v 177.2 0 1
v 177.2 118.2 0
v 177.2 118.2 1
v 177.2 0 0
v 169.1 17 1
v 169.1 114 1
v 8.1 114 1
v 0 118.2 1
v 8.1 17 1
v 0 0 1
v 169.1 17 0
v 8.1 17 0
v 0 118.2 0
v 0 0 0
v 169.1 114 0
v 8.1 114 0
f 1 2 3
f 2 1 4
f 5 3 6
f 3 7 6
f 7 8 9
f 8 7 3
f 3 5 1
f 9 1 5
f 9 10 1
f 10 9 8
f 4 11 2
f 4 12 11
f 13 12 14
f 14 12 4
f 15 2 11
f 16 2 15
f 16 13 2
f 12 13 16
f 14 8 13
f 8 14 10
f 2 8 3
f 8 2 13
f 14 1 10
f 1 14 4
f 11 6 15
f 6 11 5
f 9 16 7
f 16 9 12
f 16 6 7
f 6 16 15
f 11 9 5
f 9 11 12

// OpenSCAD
// file: part-06.scad
include	<../common/constants.scad>
use <common.scad>
use <part-01.scad>
use <part-02.scad>
use <part-03.scad>

//	그룹 of part1, part2, part3
function PART06() = [PART02().x, PART02().y + PART03().y, PART02().z];
function MARGIN06() = [0, -PART03().y, 0];

module epaper_part_06() {
	translate([MARGIN02().x, (PART02().y - PART01().y) - MARGIN02().y, PART02().z])
	epaper_part_01();
	
	epaper_part_02();

	translate([MARGIN03().x, -PART03().y, 0])
	epaper_part_03();
	
	%
	color("white")
	translate([0, -2.2, 0])
	linear_extrude(height = EPSILON) {
		text(str("⑥ = ①+②+③"), font = "D2Coding", size = 2);
	}
}

module background_06() {
}

module main() {
	%background_06();
	epaper_part_06();
}

main();
// file: part-04.scad
include	<../common/constants.scad>
use <common.scad>
use <part-01.scad>
use <part-02.scad>
use <part-03.scad>
use <part-06.scad>

//	①②③④⑤⑥⑦⑧⑨ⒶⒷⒸⒹⒺⒻⒼⒽⒾⒿⓀⓐⓑⓒⓓⓔⓕⓖⓗⓘⓙⓚⓛⓜⓝ
ID = "④";
SIZE = [0, 0, 2];
PADDING = [3, 3, 1];
PADDING_INNER = [16, 16];	//	밑판 최외곽 너비
MARGIN = [0.5, 0.5, 0.2];
COLOR = [0.8, 0.4, 0.3, 1];

function PART04() = [
	PADDING.x * 2 + MARGIN.x * 2 + PART02().x,
	PADDING.y * 2 + MARGIN.y * 2 + PART02().y,
	SIZE.z + PADDING.z
];
function MARGIN04() = [0, 0, 0];

pNotate = [PART04().x - PADDING_INNER.x - 16, PADDING_INNER.y + 16];

//	밑판
module epaper_display_part_04_01() {
	size = [
		PADDING.x * 2 + MARGIN.x * 2 + PART02().x,
		PADDING.y * 2 + MARGIN.y * 2 + PART02().y,
		SIZE.z
	];

	//	아래쪽
	color(COLOR)
	translate([0, 0, 0])
	cube([size.x, PADDING_INNER.y, size.z]);
	translate([pNotate.x - 2, 0, PART04().z])
	notate([1.5, PADDING.y]);
	translate([pNotate.x - 2, PADDING.y, PART04().z])
	notate([1.5, PADDING_INNER.y - PADDING.y]);
	translate([pNotate.x, 0, PART04().z])
	notate([2, PADDING_INNER.y]);

	//	위쪽
	color(COLOR)
	translate([0, size.y - PADDING_INNER.y, 0])
	cube([size.x, PADDING_INNER.y, size.z]);
	translate([pNotate.x - 2, size.y - PADDING.y, PART04().z])
	notate([1.5, PADDING.y]);
	translate([pNotate.x - 2, size.y - PADDING_INNER.y, PART04().z])
	notate([1.5, PADDING_INNER.y - PADDING.y]);
	translate([pNotate.x, size.y - PADDING_INNER.y, PART04().z])
	notate([2, PADDING_INNER.y]);

	//	가운데
	translate([pNotate.x, PADDING_INNER.y, PART04().z])
	notate([2, PART04().y - PADDING_INNER.y * 2]);
	
	//	왼쪽
	color(COLOR)
	translate([0, PADDING_INNER.y, 0])
	cube([PADDING_INNER.x, size.y - PADDING_INNER.y * 2, size.z]);
	translate([0, pNotate.y + 2, PART04().z])
	notate([PADDING.x, 1.5]);
	translate([PADDING.x, pNotate.y + 2, PART04().z])
	notate([PADDING_INNER.x - PADDING.x, 1.5]);
	translate([0, pNotate.y, PART04().z])
	notate([PADDING_INNER.x, 2]);

	//	오른쪽
	color(COLOR)
	translate([size.x - PADDING_INNER.x, PADDING_INNER.y, 0])
	cube([PADDING_INNER.x, size.y - PADDING_INNER.y * 2, size.z]);
	translate([size.x - PADDING.x, pNotate.y + 2, PART04().z])
	notate([PADDING.x, 1.5]);
	translate([size.x - PADDING_INNER.x, pNotate.y + 2, PART04().z])
	notate([PADDING_INNER.x - PADDING.x, 1.5]);
	translate([size.x - PADDING_INNER.x, pNotate.y, PART04().z])
	notate([PADDING_INNER.x, 2]);

	//	가운데
	translate([PADDING_INNER.x, pNotate.y, PART04().z])
	notate([PART04().x - PADDING_INNER.x * 2, 2]);
	
	//	중앙 가로선
	color(COLOR)
	translate([PADDING_INNER.x, PART04().y / 2 - PADDING_INNER.y / 2, 0])
	cube([size.x - PADDING_INNER.x * 2, PADDING_INNER.y, size.z]);
	translate([pNotate.x - 2, (PART04().y - PADDING_INNER.y) / 2, PART04().z])
	notate([1.5, PADDING_INNER.y]);

	translate([pNotate.x - 2, size.y - PADDING.y, PART04().z])
	notate([1.5, PADDING.y]);

	//	중앙 세로선
	color(COLOR)
	translate([(PART04().x - PADDING_INNER.x) / 2, PADDING_INNER.y, 0])
	cube([PADDING_INNER.x, size.y - PADDING_INNER.y * 2, size.z]);
	translate([(PART04().x - PADDING_INNER.x) / 2, pNotate.y + 2, PART04().z])
	notate([PADDING_INNER.x, 1.5]);
}

module epaper_display_part_04_02() {
	v = PART02();
	s = [
		PADDING.x * 2 + MARGIN.x * 2 + v.x,
		PADDING.y * 2 + MARGIN.y * 2 + v.y,
		PART04().z
	];
	cdelta = 0.1;
	ccolor = [COLOR[0] - cdelta, COLOR[1] - cdelta, COLOR[2] - cdelta, COLOR[3]];

	// 아래
	translate([0, 0, SIZE.z])
	color(ccolor)
	cube([s.x, PADDING.y, PADDING.z]);

	//	아래 왼쪽
	translate([0, -3, 0])
	notate([PADDING.x + MARGIN03().x, 2], up = false);

	//	아래 오른쪽
	translate([PADDING.x + MARGIN03().x + PART03().x + MARGIN.x * 2, -3, 0])
	notate([PADDING.x + MARGIN03().x, 2], str(PADDING.x + MARGIN03().x, "mm"), false);

	//	위
	translate([0, PADDING.y + v.y + MARGIN.y * 2, SIZE.z])
	color(ccolor)
	cube([s.x, PADDING.y, PADDING.z]);

	//	왼쪽
	translate([0, PADDING.y, SIZE.z])
	color(ccolor)
	cube([PADDING.x, s.y - PADDING.y * 2, PADDING.z]);

	//	오른쪽
	translate([PADDING.x + v.x + MARGIN.x * 2, PADDING.y, SIZE.z])
	color(ccolor)
	cube([PADDING.x, s.y - PADDING.y * 2 , PADDING.z]);
}
//	아래쪽에 구멍내는 거, 연결선 빠져 나가는 구멍
module epaper_part_04_03() {
	size = [
		PART03().x + MARGIN.x * 2,
		PADDING.y + MARGIN.y + EPSILON,
		SIZE.z + MARGIN.z + EPSILON];

	translate([0, -EPSILON, -EPSILON])
	cube(size);

	translate([0, -3, -EPSILON])
	notate([size.x, 2]);
}
module background_04() {
	translate([-(PART02().x + PADDING.x + MARGIN.x), PADDING.y + MARGIN.y, 0])
	epaper_part_06();
}

module epaper_part_04() {
	m2 = MARGIN02();
	s3 = PART03();
	s4 = PART04();

	difference() {
		union() {
			epaper_display_part_04_01();
			epaper_display_part_04_02();
		}

		translate([PADDING.x + MARGIN03().x - MARGIN.x * 0, 0, 0])
		epaper_part_04_03();
	}

	%color("white")
	translate([2, PART04().y - 2.3, EPSILON])
	linear_extrude(height = PART04().z) {
		text(str(ID, " Cover: ", PART04().x, " x ", PART04().y, " x ", PART04().z, "mm"), font = "D2Coding", size = 2);
	}
}

module main() {
	%background_04();
	epaper_part_04();
}

main();
// file: part-03.scad
include	<../common/constants.scad>
use <common.scad>
use <part-01.scad>
use <part-02.scad>

function PART03() = [25.50, 24.00, 0.1];
function PADDING03() = [3, 3, 1];
function MARGIN03() = [72.35, 0, 0];

SIZE = [0, 0, 2];
PADDING = [3, 3, 1];
MARGIN = [0.5, 0.5];
COLOR = [0.4, 0.8, 0.4, 0.5];

part01 = PART01();
part02 = PART02();
margin02 = MARGIN02();
part03 = PART03();
part04 = PART04();

function PART04() = [
	PADDING.x * 2 + MARGIN.x * 2 + PART02().x,
	PADDING.y * 2 + MARGIN.y * 2 + PART02().y,
	SIZE.z + PADDING.z
];
function MARGIN04() = [PADDING.x + MARGIN.x, PADDING.y + MARGIN.y, SIZE.z + PADDING.z];

module epaper_part_03() {
	s = PART03();
	m = MARGIN03();
	
	color(COLOR)
	cube(PART03());

	%color("white")
	translate([1, s.y - 4, PART03().z])
	linear_extrude(height = PART03().z + EPSILON) {
		text("3. Connector", size = 2);

		translate([2, -3])
		text(str(s.x, " x ", s.y, " x 0.1", "mm"), size = 2);
	}

	//	가로
	translate([0, 2, PART03().z])
	notate([PART03().x, 2]);
	//	세로
	translate([PART03().x - 4, 0, PART03().z])
	notate([2, PART03().y]);
}

module epaper_display_part_03() {
	s = PART03();
	m = MARGIN03();
	
	translate(m)
	{
		epaper_part_03();
	}
}

module background_03() {
	translate([0, PART03().y, 0])
	epaper_display_part_02();
}

module main() {
	%background_03();
	epaper_display_part_03();
}

epaper_display_part_03();
!epaper_part_03();
// file: part-02.scad
// 라이브러리, 검증된 것만 이곳에
include	<../common/constants.scad>
use <common.scad>
use <part-01.scad>

function PART02() = [170.20, 111.20, 0.91];
function MARGIN02() = [5.10, 4.70];
COLOR02 = [0.5, 0.5, 0.1, 0.9];

module epaper_part_02() {
	s = PART02();
	m = MARGIN02();

	//	Panel
	color(COLOR02)
	cube(s);

	pNotate = [m.x + PART01().x - 8, (s.y - 8) - m.y];

	//	왼쪽 테두리
	translate([0, pNotate.y, PART02().z])
	notate([MARGIN02().x, 2], str(MARGIN02().x, "mm"));

	//	오른쪽 테두리
	translate([pNotate.x + 8, pNotate.y, PART02().z])
	notate([MARGIN02().x, 2], str(MARGIN02().x, "mm"));

	//	위쪽 테두리
	translate([pNotate.x, PART02().y - MARGIN02().y, PART02().z])
	notate([2, MARGIN02().y]);

	//	아래쪽 테두리
	translate([pNotate.x, 0, PART02().z])
	notate([2, PART02().y - PART01().y - MARGIN02().y]);

	%translate([2, s.y - 4, EPSILON])
	color("black")
	linear_extrude(height = s.z) {
		text(str("2. Panel: (", s.x, " x ", s.y, " x ", s.z, "mm), "), size = 2);
	}
}
module epaper_display_part_02() {
	s = PART02();
	m = MARGIN02();

	//	Active Area
	translate([m.x, (s.y - PART01().y) - m.y, s.z])
	epaper_display_part_01();

	epaper_part_02();
}

epaper_display_part_02();
!epaper_part_02();
// file: part-01.scad
// 라이브러리, 검증된 것만 이곳에
include	<../common/constants.scad>
use	<common.scad>

// active area
ACTIVE_AREA_COLOR = [0.3, 0.3, 0.9, 0.9];
function PART01() = [160.00, 96.00, EPSILON];

module epaper_part_01() {
	s = PART01();

	color(ACTIVE_AREA_COLOR)
	cube(s);
	
	translate([0, s.y - 8, s.z])
	notate([s.x, 2]);

	translate([s.x - 8, 0, s.z])
	notate([2, s.y]);

	%translate([2, s.y - 4, EPSILON * 2])
	linear_extrude(height = s.z) {
		text(str("1. Active Area: ", s.x, " x ", s.y, "mm"), font = "D2Coding", size = 2);
	}
}
module epaper_display_part_01() {
	epaper_part_01();
}

epaper_display_part_01();
// file: common.scad
include	<../common/constants.scad>

// A(x0, y0), B(x1, y1), C(x2, y2) 에서 A와 직선 BC 사이 거리 계산
function pointToLineDistance(x0, y0, x1, y1, x2, y2) =
    abs((x2 - x1)*(y1 - y0) - (x1 - x0)*(y2 - y1)) /
    sqrt((x2 - x1)*(x2 - x1) + (y2 - y1)*(y2 - y1));

module HR() {
		echo("_________________________________________________________________________________");
}
module arrow_left(v) {
	leader = v.y / 32;	//	지시선 두께
	polygon([
		[0, 0],
		[leader, 0],
		[leader, v.y],
		[0, v.y]
	]);

	shaft = v.y / 24;	//	화살대 두께
	polygon([
		[0,		v.y / 2],
		[v.y,	0],
		[v.y,	v.y / 2 - shaft],
		[v.y,	v.y / 2 + shaft],
		[v.y,	v.y],

		[v.x,	v.y / 2 - shaft],
		[v.x,	v.y / 2 + shaft]
	],
	paths=[[0, 1, 2, 5, 6, 3, 4]]);
}
module arrow_right(v) {
	translate(v)
	rotate([0, 0, 180])
	arrow_left(v);
}
module arrow_up(v) {
	translate([0, v.y])
	rotate([0, 0, -90])
	arrow_left([v.y, v.x]);
}
module arrow_down(v) {
	translate([v.x, 0])
	rotate([0, 0, 90])
	arrow_left([v.y, v.x]);
}

module notateHI(v, title) {
	titleSize = v.y * len(title);

	arrow_left([(v.x - titleSize) / 2, v.y]);

	translate([v.x - (v.x - titleSize) / 2, 0])
	arrow_right([(v.x - titleSize) / 2, v.y]);

	translate([(v.x - titleSize) / 2, 0])
	text(title, font = "D2Coding", size = v.y);
}
module notateHO(v, title) {
	titleSize = v.y * len(title);
	arrowSize = v.y * 3;

	translate([-arrowSize, 0])
	arrow_right([arrowSize, v.y]);

	translate([v.x, 0])
	arrow_left([arrowSize, v.y]);

	translate([(v.x - titleSize) / 2, 0])
	text(title, font = "D2Coding", size = v.y);
}
module notateH(v, title, up, prefix) {
	prefixSafe = is_undef(prefix) ? "" : prefix;
	titleDetail = is_undef(title) ? str(prefixSafe, v.x, "mm") : title;
	titleShort = is_undef(title) ? str(prefixSafe, v.x) : title;
	titleDetailSize = v.y * len(titleDetail);
	titleShortSize = v.y * len(titleShort);
	
	arrowSize = v.y * 3;

	titleSafe = is_undef(title) ? str(v.x) : title;
	upSafe = is_undef(up) ? true : false;
	%linear_extrude(height = EPSILON) {
		if (v.x >= (arrowSize * 2 + titleDetailSize)) {
			// 화살표, 단위까지 충분히 들어간다
			notateHI(v, titleDetail);
		} else if (v.x >= (arrowSize * 2 + titleShortSize)) {
			// 화살표는 들어갈 수 있으나, 단위까지는 못 들어간다
			notateHI(v, titleShort);
		} else if (v.x >= titleDetailSize) {
			//	화살표는 못들어가나, 단위는 들어간다
			notateHO(v, titleDetail);
		} else if (v.x >= titleShortSize) {
			//	화살표는 못들어가나, 수치는 들어간다
			notateHO(v, titleShort);
		} else {
			// 바깥에 표시해야 한다
			notateHO(v, "");
			if (upSafe) {
				translate([(v.x - titleDetailSize) / 2, v.y])
				text(titleDetail, font = "D2Coding", size = v.y);
			} else {
				translate([(v.x - titleDetailSize) / 2, -v.y])
				text(titleDetail, font = "D2Coding", size = v.y);
			}
		}
	}
}
module notateV(v, title, up, prefix) {
	translate([v.x, 0])
	rotate([0, 0, 90])
	notateH([v.y, v.x], title, up, prefix);
}
module notate(v, title, up, prefix) {
	if (v.x > v.y) {
		notateH(v, title, up, prefix);
	} else {
		notateV(v, title, up, prefix);
	}
}
module test() {
	// 테스트
	x0 = 2; y0 = 2;    // 점 A
	x1 = 0; y1 = 0;    // 점 B
	x2 = 4; y2 = 0;    // 점 C

	distance = pointToLineDistance(x0, y0, x1, y1, x2, y2);
	HR();
	echo("A에서 BC까지의 거리: ", distance);
	HR();
}
module main() {
	SHORT = 20;
	//notate([32, 16], str(32, "mm"));
	//notateH([3, 4]);
	notate([13, 4]);
	arrow_left([8, 2]);

	test();
}

main();
// file: ../common/constants.scad
// 상수들 정의
// include 사용하시오
MAX = [220, 220, 250];
ZERO = [0, 0, 0];
HALF = [1/2, 1/2, 1/2];
ONE = [1, 1, 1];
BIG = [1024, 1024, 1024];
EPSILON = 0.01;
EPSILON2 = EPSILON * 2;
MINIMUM = 0.1;	//	0.1mm
NOZZLE = 0.4;	//	노즐 지름
OVERHANG_THRESHOLD = 30;

FN = $preview ? 16 : 360;

//	자원들
RADIUS_HOLE_NUT_25 = 3.4 / 2;	//	검은색 25mm 나사 너트 구멍 반지름
// main file
// 라이브러리, 검증된 것만 이곳에
include	<../common/constants.scad>

use <common.scad>
use <part-01.scad>
use <part-02.scad>
use <part-03.scad>
use <part-04.scad>
//	①②③④⑤⑥⑦⑧⑨ⒶⒷⒸⒹⒺⒻⒼⒽⒾⒿⓀⓐⓑⓒⓓⓔⓕⓖⓗⓘⓙⓚⓛⓜⓝ

ID = "⑤";
MARGIN_BACKGROUND = [8, 8];
COLOR = [0.3, 0.5, 0.1, 0.9];

function PART05() = [PART04().x, PART04().y, 1];
function PADDING05() = [0.5, 0.5];

pNotate = [PART05().x - 16, 16];

module background_05() {
	margin02 = MARGIN02();
	margin04 = MARGIN04();
	part05 = PART05();

	translate([-PART05().x - MARGIN_BACKGROUND.x, 0, 0])
	epaper_part_04();

	translate([margin02.x + margin04.x, margin02.y + margin04.y + MARGIN_BACKGROUND.y, 0])
	translate([0, part05.y, 0])
	epaper_display_part_01();
}
module epaper_display_part_05() {
	part01 = PART01();
	part02 = PART02();

	margin02 = MARGIN02();
	margin04 = MARGIN04();
	part05 = PART05();

	s01 = [
		part01.x + PADDING05().x * 2,
		part01.y + PADDING05().y * 2,
		part05.z
	];
	p01 = [
		(PART05().x - s01.x) / 2,
		s01.y + (PART04().y - part01.y) - (margin02.y + margin04.y) - PADDING05().y,
		0
	];
	dpy = 4;
	difference() {
		union() {
			//	원래판
			color(COLOR)
			cube(PART05());
			%translate([0, PART05().y / 2, PART05().z])	text(ID, font = "D2Coding", size = 2);

			%color("yellow")
			translate([2, PART05().y - 3, PART05().z + EPSILON * 2])
			linear_extrude(height = PART05().z) {
				text(str(ID, " Cover Outter: ", PART05().x, " x ", PART05().y, " x ", PART05().z, "mm"), font = "D2Coding", size = 2);
			}
			
			//	왼쪽
			translate([0, p01.y - dpy, PART05().z])
			notate([(PART05().x - s01.x) / 2, 2]);

			translate([(PART05().x - s01.x) / 2, p01.y - dpy, PART05().z])
			notate([(s01.x), 2]);

			translate([PART05().x - (PART05().x - s01.x) / 2, p01.y - dpy, PART05().z])
			notate([(PART05().x - s01.x) / 2, 2]);
		}
		
		//	삭제판, Active Area
		translate([p01.x, p01.y - s01.y, -EPSILON])
		cube([s01.x, s01.y, s01.z + EPSILON * 2]);
	}

	dpx = part05.x - p01.x * 2 - 4;
	translate([p01.x + dpx, 0, PART05().z])
	notate([2, p01.y - s01.y]);

	translate([p01.x + dpx, p01.y - s01.y, PART05().z])
	notate([2, part01.y + PADDING05().y * 2]);

	translate([p01.x + dpx, p01.y, PART05().z])
	notate([2, part05.y - p01.y]);
}
module main() {
	%background_05();
	epaper_display_part_05();
}

main();
